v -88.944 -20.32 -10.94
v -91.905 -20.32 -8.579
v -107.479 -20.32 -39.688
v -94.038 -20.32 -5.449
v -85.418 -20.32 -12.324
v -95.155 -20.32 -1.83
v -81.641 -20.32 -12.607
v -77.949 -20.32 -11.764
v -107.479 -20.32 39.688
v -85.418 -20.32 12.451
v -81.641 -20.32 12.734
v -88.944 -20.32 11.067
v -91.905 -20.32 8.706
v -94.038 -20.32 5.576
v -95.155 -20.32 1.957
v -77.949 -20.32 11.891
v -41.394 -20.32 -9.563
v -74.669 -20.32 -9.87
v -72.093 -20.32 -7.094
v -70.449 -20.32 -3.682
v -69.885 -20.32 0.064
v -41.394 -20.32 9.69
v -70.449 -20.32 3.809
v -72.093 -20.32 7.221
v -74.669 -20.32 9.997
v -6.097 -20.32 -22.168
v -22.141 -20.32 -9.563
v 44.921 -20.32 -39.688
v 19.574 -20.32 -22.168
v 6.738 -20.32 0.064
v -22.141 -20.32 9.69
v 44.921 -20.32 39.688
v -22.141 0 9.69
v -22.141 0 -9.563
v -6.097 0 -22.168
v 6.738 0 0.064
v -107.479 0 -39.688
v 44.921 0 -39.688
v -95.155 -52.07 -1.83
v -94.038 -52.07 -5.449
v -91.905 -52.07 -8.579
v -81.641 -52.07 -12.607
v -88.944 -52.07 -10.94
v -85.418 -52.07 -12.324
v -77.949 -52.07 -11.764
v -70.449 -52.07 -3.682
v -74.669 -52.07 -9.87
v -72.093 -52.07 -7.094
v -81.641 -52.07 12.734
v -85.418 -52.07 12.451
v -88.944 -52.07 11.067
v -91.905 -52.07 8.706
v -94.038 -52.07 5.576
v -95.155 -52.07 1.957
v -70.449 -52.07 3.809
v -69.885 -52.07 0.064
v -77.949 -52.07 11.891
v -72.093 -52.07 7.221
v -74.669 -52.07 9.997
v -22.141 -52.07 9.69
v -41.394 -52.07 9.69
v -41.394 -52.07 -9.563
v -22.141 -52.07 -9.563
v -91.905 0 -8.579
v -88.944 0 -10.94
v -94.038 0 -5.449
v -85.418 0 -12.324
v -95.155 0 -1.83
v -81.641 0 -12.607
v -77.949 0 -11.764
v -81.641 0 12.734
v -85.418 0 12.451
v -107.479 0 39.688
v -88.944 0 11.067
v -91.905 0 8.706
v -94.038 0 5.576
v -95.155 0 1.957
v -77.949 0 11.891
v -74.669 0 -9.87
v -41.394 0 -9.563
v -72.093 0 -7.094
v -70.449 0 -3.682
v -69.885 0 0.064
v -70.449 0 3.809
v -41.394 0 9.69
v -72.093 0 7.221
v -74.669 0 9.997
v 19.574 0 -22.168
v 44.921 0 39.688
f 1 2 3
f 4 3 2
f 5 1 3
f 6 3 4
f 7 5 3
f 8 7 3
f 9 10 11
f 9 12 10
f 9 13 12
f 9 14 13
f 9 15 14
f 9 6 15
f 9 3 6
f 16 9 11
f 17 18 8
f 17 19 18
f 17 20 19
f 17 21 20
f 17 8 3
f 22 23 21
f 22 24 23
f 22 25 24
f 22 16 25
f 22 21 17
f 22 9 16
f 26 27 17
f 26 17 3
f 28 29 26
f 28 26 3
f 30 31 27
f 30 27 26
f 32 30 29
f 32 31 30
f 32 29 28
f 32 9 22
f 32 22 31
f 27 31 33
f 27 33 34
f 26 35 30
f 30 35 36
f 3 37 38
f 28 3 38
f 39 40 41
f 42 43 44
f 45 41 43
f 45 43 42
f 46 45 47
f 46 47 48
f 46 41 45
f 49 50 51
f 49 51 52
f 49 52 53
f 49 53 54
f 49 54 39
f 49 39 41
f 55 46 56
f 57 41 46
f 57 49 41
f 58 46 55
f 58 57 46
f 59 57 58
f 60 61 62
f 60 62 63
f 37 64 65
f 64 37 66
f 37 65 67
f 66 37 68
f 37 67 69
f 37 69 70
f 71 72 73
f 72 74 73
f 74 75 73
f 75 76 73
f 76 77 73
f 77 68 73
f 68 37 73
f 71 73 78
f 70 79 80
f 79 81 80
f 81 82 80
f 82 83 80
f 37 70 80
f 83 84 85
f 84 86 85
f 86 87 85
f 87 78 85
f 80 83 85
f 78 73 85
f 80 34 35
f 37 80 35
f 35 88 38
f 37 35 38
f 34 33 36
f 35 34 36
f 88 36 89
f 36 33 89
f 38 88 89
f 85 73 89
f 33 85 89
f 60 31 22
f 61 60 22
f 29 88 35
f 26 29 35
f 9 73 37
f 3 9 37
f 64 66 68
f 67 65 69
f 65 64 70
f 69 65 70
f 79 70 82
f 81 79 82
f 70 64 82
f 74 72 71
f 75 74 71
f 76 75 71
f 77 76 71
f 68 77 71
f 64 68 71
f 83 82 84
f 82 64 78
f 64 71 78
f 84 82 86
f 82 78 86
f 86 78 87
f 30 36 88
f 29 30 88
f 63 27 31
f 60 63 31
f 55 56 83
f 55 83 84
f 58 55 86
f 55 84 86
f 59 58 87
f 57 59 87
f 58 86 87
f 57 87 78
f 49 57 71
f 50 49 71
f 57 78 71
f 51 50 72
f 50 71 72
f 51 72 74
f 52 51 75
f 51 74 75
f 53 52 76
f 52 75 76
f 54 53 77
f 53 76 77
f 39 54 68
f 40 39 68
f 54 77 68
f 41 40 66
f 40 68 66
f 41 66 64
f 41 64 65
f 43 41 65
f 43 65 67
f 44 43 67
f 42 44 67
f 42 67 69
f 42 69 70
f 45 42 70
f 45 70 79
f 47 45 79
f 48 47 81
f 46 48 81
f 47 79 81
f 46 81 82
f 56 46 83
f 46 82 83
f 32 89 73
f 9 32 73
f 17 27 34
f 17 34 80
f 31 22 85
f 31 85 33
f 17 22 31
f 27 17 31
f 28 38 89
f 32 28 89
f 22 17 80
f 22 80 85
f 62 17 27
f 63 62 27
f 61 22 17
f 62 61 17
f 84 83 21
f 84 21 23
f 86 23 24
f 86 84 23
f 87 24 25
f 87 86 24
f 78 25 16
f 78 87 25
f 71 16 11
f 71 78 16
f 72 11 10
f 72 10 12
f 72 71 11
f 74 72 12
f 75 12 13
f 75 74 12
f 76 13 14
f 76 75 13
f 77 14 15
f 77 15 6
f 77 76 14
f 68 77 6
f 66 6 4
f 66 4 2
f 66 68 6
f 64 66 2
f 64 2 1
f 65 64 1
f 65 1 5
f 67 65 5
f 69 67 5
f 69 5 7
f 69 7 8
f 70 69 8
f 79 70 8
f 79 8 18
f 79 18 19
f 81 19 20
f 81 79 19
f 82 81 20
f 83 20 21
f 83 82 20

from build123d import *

# Parameters (mm, degrees)
F0_R     = 12.705854617
F1_DEPTH = 20.32
F2_DEPTH = 52.07
F3_START = 20.32
F3_DEPTH = 31.75


with BuildPart() as f1:
    # F0 (on Front) → F1 (new body)
    with BuildSketch(Plane.XZ):
        Polygon((44.9211280584, -39.6875), (44.9211280584, 0), (44.9211280584, 39.6875), (-107.4788719416, 39.6875), (-107.4788719416, -39.6875), align=None)
        Polygon((-6.0967609561, -22.1677589062), (6.738481146, 0.0635325421), (19.5737232482, -22.1677589062), align=None, mode=Mode.SUBTRACT)
        with Locations((-82.5906636285, 0.0635325421)):
            Circle(F0_R, mode=Mode.SUBTRACT)
        Polygon((-41.3936767371, 9.6899641188), (-30.4837209502, 9.6899641188), (-22.1408135838, 9.6899641188), (-22.1408135838, -9.5628990345), (-41.3936767371, -9.5628990345), align=None, mode=Mode.SUBTRACT)
    extrude(amount=F1_DEPTH)


with BuildPart() as f2:
    # F0 (on Front) → F2 (new body)
    with BuildSketch(Plane.XZ):
        with Locations((-82.5906636285, 0.0635325421)):
            Circle(F0_R)
    extrude(amount=F2_DEPTH)


with BuildPart() as f3:
    # F0 (on Front) → F3 (new body)
    with BuildSketch(Plane.XZ.offset(F3_START)):
        Polygon((-22.1408135838, 9.6899641188), (-30.4837209502, 9.6899641188), (-41.3936767371, 9.6899641188), (-41.3936767371, -9.5628990345), (-22.1408135838, -9.5628990345), align=None)
    extrude(amount=F3_DEPTH)


solid = Compound([f1.part, f2.part, f3.part])
